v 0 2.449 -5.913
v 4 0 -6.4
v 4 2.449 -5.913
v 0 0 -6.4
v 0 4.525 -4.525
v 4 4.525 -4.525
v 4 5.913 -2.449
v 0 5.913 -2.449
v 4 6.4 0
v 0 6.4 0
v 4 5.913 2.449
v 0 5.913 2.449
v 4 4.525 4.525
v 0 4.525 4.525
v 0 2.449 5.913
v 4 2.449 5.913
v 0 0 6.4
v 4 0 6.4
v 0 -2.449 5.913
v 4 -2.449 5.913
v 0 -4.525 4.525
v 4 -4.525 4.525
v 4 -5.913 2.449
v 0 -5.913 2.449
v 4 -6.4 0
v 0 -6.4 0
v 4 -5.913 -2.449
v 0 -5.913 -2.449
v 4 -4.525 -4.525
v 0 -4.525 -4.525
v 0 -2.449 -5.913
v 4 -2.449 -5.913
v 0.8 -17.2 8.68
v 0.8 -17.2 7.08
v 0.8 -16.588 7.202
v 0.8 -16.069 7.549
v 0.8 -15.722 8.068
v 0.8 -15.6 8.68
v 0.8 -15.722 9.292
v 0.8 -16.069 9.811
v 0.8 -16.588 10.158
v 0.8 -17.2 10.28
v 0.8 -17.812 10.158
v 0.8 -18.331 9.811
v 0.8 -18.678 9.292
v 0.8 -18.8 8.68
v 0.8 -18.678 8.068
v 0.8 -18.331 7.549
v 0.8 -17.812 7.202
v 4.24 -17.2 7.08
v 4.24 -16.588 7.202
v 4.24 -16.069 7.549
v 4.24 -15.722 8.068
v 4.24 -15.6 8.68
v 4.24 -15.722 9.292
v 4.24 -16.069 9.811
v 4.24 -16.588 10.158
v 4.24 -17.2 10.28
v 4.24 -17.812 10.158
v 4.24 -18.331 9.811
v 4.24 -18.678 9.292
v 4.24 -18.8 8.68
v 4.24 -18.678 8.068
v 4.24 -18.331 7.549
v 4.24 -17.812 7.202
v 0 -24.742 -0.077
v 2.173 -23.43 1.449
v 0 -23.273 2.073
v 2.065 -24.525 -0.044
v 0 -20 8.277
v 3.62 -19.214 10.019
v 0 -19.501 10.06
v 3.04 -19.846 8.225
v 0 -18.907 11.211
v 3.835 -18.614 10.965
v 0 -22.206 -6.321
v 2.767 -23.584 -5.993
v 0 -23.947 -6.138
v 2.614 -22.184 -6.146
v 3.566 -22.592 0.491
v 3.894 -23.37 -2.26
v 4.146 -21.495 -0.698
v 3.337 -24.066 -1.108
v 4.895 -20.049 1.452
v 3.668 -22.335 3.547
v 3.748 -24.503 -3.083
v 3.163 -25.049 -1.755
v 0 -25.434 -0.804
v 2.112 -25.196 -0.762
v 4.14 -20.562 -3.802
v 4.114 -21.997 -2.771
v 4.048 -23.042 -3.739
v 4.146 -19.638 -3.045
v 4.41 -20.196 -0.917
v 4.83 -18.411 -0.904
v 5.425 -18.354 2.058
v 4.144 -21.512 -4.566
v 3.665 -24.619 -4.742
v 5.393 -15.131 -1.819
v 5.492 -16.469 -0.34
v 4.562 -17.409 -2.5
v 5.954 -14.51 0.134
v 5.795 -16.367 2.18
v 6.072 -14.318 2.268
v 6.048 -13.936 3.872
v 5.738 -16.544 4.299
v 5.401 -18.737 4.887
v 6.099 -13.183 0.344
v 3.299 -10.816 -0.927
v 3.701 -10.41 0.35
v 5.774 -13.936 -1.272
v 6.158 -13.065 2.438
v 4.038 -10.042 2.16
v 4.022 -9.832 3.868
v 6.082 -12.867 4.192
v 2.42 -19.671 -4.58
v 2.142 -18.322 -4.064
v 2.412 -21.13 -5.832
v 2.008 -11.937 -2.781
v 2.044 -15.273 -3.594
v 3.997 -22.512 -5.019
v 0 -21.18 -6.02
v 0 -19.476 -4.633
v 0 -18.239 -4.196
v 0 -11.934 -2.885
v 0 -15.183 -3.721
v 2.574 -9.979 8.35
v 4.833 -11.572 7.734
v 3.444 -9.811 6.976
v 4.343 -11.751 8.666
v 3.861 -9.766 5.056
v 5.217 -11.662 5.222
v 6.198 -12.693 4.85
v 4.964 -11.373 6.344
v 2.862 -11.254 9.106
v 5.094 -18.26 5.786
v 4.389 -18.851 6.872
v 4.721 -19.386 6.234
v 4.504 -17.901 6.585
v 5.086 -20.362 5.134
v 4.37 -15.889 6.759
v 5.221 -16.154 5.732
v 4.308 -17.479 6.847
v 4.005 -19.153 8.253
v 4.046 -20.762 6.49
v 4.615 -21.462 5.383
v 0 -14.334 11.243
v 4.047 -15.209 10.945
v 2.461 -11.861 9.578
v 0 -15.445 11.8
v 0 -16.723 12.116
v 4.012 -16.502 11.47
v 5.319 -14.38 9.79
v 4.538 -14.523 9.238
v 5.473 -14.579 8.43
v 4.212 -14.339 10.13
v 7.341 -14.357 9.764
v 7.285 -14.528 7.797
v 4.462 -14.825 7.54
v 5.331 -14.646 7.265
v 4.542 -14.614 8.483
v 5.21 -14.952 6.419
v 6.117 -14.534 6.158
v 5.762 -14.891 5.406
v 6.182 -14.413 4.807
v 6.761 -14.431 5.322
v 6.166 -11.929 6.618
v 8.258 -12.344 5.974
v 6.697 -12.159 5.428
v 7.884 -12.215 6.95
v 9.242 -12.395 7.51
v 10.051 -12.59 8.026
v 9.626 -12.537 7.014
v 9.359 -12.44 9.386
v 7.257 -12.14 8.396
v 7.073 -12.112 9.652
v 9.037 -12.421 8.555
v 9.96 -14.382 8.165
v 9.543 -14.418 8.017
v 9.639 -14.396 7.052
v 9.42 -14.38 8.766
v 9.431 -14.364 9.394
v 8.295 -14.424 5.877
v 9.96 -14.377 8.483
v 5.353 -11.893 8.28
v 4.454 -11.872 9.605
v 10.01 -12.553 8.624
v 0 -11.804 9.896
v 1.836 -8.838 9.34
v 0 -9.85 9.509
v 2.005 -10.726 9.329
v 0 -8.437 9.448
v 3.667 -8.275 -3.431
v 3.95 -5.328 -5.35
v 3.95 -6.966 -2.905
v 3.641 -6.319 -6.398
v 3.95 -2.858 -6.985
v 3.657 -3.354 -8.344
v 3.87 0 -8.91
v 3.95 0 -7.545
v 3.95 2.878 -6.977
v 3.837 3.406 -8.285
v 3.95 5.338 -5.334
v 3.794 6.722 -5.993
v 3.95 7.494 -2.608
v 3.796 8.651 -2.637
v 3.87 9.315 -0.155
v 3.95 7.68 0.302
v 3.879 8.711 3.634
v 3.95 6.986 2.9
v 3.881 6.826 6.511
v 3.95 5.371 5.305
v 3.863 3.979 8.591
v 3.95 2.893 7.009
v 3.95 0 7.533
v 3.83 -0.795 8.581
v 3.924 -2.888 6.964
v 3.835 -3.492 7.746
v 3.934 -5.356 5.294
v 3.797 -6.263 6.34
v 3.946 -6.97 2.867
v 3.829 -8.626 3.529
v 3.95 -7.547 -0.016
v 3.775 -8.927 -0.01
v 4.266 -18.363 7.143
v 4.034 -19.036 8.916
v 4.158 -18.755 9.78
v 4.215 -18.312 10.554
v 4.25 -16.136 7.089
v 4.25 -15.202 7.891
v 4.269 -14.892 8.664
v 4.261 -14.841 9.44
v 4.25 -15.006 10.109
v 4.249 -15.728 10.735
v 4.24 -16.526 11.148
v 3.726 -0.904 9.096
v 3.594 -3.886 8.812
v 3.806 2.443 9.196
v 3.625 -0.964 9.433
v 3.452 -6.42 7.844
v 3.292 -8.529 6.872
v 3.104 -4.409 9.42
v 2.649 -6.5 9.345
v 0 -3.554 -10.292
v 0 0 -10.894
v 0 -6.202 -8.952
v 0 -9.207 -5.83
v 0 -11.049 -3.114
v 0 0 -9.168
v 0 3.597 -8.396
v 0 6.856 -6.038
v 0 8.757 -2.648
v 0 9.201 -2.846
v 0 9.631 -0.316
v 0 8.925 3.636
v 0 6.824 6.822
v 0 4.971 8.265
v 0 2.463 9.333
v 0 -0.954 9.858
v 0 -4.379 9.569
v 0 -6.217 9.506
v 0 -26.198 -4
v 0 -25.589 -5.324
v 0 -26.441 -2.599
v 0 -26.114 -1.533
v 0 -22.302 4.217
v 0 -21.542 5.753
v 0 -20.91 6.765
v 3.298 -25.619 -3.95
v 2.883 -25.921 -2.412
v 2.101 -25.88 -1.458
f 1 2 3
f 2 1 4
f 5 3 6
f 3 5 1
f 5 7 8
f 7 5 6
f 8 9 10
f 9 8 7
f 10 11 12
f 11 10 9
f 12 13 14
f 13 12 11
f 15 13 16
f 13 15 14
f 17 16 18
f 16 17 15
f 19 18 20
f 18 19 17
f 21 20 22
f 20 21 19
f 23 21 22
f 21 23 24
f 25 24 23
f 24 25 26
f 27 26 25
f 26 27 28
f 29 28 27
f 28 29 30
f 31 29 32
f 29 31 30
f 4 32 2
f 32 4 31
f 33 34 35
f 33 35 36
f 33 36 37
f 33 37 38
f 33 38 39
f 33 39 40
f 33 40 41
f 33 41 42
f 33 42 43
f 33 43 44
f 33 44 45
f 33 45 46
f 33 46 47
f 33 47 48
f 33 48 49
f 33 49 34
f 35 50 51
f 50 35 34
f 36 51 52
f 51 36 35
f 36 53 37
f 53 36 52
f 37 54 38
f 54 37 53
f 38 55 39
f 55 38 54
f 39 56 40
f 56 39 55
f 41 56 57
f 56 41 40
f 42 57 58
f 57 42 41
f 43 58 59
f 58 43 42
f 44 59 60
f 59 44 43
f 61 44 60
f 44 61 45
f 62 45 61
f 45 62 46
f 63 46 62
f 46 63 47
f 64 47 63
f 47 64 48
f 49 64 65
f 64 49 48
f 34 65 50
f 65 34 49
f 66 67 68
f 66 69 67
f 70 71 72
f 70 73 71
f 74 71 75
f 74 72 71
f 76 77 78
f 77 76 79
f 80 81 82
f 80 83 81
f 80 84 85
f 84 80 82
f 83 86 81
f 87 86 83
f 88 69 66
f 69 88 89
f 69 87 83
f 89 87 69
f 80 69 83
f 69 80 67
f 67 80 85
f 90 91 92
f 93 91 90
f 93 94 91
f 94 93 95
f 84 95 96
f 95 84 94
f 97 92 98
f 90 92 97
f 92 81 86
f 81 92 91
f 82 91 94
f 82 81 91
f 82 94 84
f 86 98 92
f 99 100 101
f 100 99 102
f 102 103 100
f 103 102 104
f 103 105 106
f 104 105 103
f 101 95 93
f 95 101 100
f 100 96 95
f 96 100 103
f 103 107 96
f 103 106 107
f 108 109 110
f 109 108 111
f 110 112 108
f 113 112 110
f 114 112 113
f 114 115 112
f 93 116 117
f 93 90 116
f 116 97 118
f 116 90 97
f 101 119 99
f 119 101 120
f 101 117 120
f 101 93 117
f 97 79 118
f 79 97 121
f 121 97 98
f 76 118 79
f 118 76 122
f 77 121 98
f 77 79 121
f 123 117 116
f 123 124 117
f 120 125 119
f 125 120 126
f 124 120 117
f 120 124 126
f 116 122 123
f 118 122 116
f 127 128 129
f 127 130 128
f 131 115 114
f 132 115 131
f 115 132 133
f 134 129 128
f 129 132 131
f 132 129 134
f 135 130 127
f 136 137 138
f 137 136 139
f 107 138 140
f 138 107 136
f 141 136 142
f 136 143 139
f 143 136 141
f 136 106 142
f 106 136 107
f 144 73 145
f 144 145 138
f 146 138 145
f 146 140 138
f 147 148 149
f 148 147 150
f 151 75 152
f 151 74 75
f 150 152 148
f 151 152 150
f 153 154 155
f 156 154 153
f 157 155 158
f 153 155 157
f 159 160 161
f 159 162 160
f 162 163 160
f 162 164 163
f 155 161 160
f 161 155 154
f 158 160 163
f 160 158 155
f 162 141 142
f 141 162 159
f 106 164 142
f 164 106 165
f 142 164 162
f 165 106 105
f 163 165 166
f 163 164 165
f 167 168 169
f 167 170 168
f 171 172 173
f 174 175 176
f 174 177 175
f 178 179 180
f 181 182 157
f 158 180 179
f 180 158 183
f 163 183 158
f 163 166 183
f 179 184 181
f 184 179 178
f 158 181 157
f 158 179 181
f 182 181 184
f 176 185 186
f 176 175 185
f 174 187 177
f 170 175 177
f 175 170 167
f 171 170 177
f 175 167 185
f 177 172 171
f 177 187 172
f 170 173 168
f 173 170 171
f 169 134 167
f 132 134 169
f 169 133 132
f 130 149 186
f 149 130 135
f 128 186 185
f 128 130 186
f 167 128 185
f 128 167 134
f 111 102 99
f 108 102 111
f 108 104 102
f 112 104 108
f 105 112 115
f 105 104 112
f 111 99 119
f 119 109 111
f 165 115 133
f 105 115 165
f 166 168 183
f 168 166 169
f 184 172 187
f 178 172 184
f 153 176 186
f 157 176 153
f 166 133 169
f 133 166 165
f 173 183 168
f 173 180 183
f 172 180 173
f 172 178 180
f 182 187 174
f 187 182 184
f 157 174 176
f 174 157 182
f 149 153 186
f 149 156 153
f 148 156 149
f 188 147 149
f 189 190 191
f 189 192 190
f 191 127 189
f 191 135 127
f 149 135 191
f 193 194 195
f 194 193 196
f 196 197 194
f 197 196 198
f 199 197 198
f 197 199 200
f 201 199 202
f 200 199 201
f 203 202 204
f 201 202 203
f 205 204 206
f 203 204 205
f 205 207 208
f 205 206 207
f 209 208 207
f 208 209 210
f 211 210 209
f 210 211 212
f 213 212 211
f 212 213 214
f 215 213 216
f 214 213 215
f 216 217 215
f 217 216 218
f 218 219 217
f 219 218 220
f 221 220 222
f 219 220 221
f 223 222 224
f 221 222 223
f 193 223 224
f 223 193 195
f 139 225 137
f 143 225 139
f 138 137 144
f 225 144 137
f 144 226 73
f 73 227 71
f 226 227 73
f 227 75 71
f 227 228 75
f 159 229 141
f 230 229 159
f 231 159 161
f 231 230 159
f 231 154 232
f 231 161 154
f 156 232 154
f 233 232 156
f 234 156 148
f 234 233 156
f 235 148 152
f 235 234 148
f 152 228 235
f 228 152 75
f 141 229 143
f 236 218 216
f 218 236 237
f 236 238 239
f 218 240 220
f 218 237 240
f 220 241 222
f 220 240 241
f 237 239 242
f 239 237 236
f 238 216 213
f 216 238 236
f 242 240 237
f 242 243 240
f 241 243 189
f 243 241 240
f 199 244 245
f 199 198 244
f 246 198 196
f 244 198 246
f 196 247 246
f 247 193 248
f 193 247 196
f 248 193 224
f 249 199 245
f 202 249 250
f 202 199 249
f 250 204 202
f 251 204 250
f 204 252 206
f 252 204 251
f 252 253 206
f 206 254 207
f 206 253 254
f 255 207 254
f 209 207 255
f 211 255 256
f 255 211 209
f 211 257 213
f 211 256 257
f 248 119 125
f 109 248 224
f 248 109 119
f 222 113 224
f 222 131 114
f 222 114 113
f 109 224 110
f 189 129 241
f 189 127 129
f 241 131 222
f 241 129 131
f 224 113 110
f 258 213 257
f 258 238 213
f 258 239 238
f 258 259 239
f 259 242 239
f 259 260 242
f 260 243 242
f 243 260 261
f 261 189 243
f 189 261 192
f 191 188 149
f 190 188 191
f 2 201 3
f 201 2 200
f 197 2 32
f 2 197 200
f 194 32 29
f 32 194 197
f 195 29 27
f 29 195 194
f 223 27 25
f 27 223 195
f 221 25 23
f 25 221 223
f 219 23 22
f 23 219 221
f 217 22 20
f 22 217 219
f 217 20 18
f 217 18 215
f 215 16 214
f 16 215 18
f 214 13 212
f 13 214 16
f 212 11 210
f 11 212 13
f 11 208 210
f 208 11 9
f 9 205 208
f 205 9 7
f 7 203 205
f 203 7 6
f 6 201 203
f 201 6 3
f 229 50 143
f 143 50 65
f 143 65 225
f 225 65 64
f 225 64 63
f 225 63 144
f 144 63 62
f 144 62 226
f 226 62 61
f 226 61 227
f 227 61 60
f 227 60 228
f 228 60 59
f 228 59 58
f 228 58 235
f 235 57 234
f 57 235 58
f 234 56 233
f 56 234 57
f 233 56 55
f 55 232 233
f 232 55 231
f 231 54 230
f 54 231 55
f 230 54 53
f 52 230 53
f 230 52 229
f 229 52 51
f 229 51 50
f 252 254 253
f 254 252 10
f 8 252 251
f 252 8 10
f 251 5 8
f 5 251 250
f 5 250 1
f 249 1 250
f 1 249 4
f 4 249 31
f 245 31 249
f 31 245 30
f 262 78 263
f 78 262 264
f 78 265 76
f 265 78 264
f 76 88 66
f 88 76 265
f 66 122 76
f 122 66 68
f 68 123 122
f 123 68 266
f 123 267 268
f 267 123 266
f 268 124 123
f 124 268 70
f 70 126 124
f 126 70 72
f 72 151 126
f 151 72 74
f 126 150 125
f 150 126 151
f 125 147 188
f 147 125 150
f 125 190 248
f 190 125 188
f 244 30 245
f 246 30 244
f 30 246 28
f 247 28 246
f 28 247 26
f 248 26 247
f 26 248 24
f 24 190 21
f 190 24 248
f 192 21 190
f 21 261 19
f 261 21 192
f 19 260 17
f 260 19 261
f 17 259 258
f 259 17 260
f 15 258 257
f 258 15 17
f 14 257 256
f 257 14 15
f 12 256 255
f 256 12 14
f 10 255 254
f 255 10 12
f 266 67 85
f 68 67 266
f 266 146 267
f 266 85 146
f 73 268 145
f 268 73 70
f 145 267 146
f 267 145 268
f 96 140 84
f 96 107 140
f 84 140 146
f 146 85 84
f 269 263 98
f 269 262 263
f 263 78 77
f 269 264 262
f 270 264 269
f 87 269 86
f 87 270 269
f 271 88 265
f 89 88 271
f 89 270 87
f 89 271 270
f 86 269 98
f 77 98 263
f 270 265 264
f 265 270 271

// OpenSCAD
use <../lib.scad>
use <s/64835s01.scad>
$fa=1; $fs=0.2;
function ldraw_lib__64835(realsolid=false) = [
// 0 ~Animal Cow Head Left
// 0 Name: 64835.dat
// 0 Author: Philippe Hurbain [Philo]
// 0 !LDRAW_ORG Part UPDATE 2015-01
// 0 !LICENSE Licensed under CC BY 2.0 and CC BY 4.0 : see CAreadme.txt
// 
// 0 BFC CERTIFY CCW
  [0,"BFC","CERTIFY"],
  [0,"BFC","CCW"],
// 
// 0 !HISTORY 2013-12-19 {LEGO Digital Designer} Original part shape
// 0 !HISTORY 2013-12-19 [Philo] File preparation for LDraw Parts Tracker
// 0 !HISTORY 2015-10-11 [PTadmin] Official Update 2015-01
// 
// 
// 1 16 0 0 0 1 0 0 0 1 0 0 0 1 s\64835s01.dat
  [1,16,0,0,0,1,0,0,0,1,0,0,0,1, ldraw_lib__s__64835s01(realsolid)],
// 0 // Blaze
// 3 16 0 -10.543 -55.754 5.433 -3.622 -58.575 9.169 -8.867 -55.838
  [3,16,0,-10.543,-55.754,5.433,-3.622,-58.575,9.169,-8.867,-55.838],
// 3 16 0 -5.183 -58.182 5.433 -3.622 -58.575 0 -10.543 -55.754
  [3,16,0,-5.183,-58.182,5.433,-3.622,-58.575,0,-10.543,-55.754],
// 3 16 0 -10.543 -55.754 11.538 -13.457 -53.654 0 -14.382 -53.854
  [3,16,0,-10.543,-55.754,11.538,-13.457,-53.654,0,-14.382,-53.854],
// 3 16 0 -10.543 -55.754 9.169 -8.867 -55.838 11.538 -13.457 -53.654
  [3,16,0,-10.543,-55.754,9.169,-8.867,-55.838,11.538,-13.457,-53.654],
// 3 16 7.599 -20.563 -49.615 0 -16.913 -52.275 10.115 -16.226 -51.906
  [3,16,7.599,-20.563,-49.615,0,-16.913,-52.275,10.115,-16.226,-51.906],
// 3 16 0 -16.913 -52.275 7.599 -20.563 -49.615 0 -20.693 -49.999
  [3,16,0,-16.913,-52.275,7.599,-20.563,-49.615,0,-20.693,-49.999],
// 3 16 10.115 -16.226 -51.906 0 -14.382 -53.854 11.538 -13.457 -53.654
  [3,16,10.115,-16.226,-51.906,0,-14.382,-53.854,11.538,-13.457,-53.654],
// 3 16 0 -14.382 -53.854 10.115 -16.226 -51.906 0 -16.913 -52.275
  [3,16,0,-14.382,-53.854,10.115,-16.226,-51.906,0,-16.913,-52.275],
// 0 // Eye
// 3 16 13.562 -5.145 -45.885 12.714 -12.836 -50.906 12.237 -3.63 -50.122
  [3,16,13.562,-5.145,-45.885,12.714,-12.836,-50.906,12.237,-3.63,-50.122],
// 3 16 13.562 -5.145 -45.885 13.503 -12.218 -46.842 12.714 -12.836 -50.906
  [3,16,13.562,-5.145,-45.885,13.503,-12.218,-46.842,12.714,-12.836,-50.906],
// 3 16 12.237 -3.63 -50.122 12.714 -12.836 -50.906 11.538 -13.457 -53.654
  [3,16,12.237,-3.63,-50.122,12.714,-12.836,-50.906,11.538,-13.457,-53.654],
// 3 16 11.538 -13.457 -53.654 9.169 -8.867 -55.838 12.237 -3.63 -50.122
  [3,16,11.538,-13.457,-53.654,9.169,-8.867,-55.838,12.237,-3.63,-50.122],
// 0 // Muzzle
// 3 16 8.244 9.875 -64.048 0 13.311 -63.972 9.162 11.854 -61.547
  [3,16,8.244,9.875,-64.048,0,13.311,-63.972,9.162,11.854,-61.547],
// 3 16 8.244 9.875 -64.048 0 10 -65.494 0 13.311 -63.972
  [3,16,8.244,9.875,-64.048,0,10,-65.494,0,13.311,-63.972],
// 3 16 0 13.311 -63.972 0 15.345 -59.867 6.918 14.983 -58.959
  [3,16,0,13.311,-63.972,0,15.345,-59.867,6.918,14.983,-58.959],
// 3 16 8.244 9.875 -64.048 0 6.498 -66.102 0 10 -65.494
  [3,16,8.244,9.875,-64.048,0,6.498,-66.102,0,10,-65.494],
// 3 16 7.207 6.029 -64.803 0 6.498 -66.102 8.244 9.875 -64.048
  [3,16,7.207,6.029,-64.803,0,6.498,-66.102,8.244,9.875,-64.048],
// 3 16 7.907 4.388 -62.623 8.244 9.875 -64.048 9.369 7.707 -61.257
  [3,16,7.907,4.388,-62.623,8.244,9.875,-64.048,9.369,7.707,-61.257],
// 3 16 7.907 4.388 -62.623 7.207 6.029 -64.803 8.244 9.875 -64.048
  [3,16,7.907,4.388,-62.623,7.207,6.029,-64.803,8.244,9.875,-64.048],
// 3 16 5.253 3.646 -64.701 0 2.01 -63.584 0 3.833 -65.285
  [3,16,5.253,3.646,-64.701,0,2.01,-63.584,0,3.833,-65.285],
// 3 16 5.281 1.905 -62.989 0 2.01 -63.584 5.253 3.646 -64.701
  [3,16,5.281,1.905,-62.989,0,2.01,-63.584,5.253,3.646,-64.701],
// 3 16 5.281 1.905 -62.989 7.207 6.029 -64.803 7.907 4.388 -62.623
  [3,16,5.281,1.905,-62.989,7.207,6.029,-64.803,7.907,4.388,-62.623],
// 3 16 5.281 1.905 -62.989 5.253 3.646 -64.701 7.207 6.029 -64.803
  [3,16,5.281,1.905,-62.989,5.253,3.646,-64.701,7.207,6.029,-64.803],
// 3 16 9.369 7.707 -61.257 8.244 9.875 -64.048 9.162 11.854 -61.547
  [3,16,9.369,7.707,-61.257,8.244,9.875,-64.048,9.162,11.854,-61.547],
// 3 16 6.918 14.983 -58.959 9.162 11.854 -61.547 0 13.311 -63.972
  [3,16,6.918,14.983,-58.959,9.162,11.854,-61.547,0,13.311,-63.972],
// 3 16 7.207 6.029 -64.803 0 3.833 -65.285 0 6.498 -66.102
  [3,16,7.207,6.029,-64.803,0,3.833,-65.285,0,6.498,-66.102],
// 3 16 0 3.833 -65.285 7.207 6.029 -64.803 5.253 3.646 -64.701
  [3,16,0,3.833,-65.285,7.207,6.029,-64.803,5.253,3.646,-64.701],
// 0 // Condlines
// 5 24 0 -10.543 -55.754 5.433 -3.622 -58.575 9.169 -8.867 -55.838 0 -5.183 -58.182
  [5,24,0,-10.543,-55.754,5.433,-3.622,-58.575,9.169,-8.867,-55.838,0,-5.183,-58.182],
// 5 24 9.169 -8.867 -55.838 0 -10.543 -55.754 5.433 -3.622 -58.575 11.538 -13.457 -53.654
  [5,24,9.169,-8.867,-55.838,0,-10.543,-55.754,5.433,-3.622,-58.575,11.538,-13.457,-53.654],
// 5 24 0 -10.543 -55.754 11.538 -13.457 -53.654 0 -14.382 -53.854 9.169 -8.867 -55.838
  [5,24,0,-10.543,-55.754,11.538,-13.457,-53.654,0,-14.382,-53.854,9.169,-8.867,-55.838],
// 5 24 11.538 -13.457 -53.654 0 -14.382 -53.854 0 -10.543 -55.754 10.115 -16.226 -51.906
  [5,24,11.538,-13.457,-53.654,0,-14.382,-53.854,0,-10.543,-55.754,10.115,-16.226,-51.906],
// 5 24 9.169 -8.867 -55.838 11.538 -13.457 -53.654 0 -10.543 -55.754 12.237 -3.63 -50.122
  [5,24,9.169,-8.867,-55.838,11.538,-13.457,-53.654,0,-10.543,-55.754,12.237,-3.63,-50.122],
// 5 24 7.599 -20.563 -49.615 0 -16.913 -52.275 10.115 -16.226 -51.906 0 -20.693 -49.999
  [5,24,7.599,-20.563,-49.615,0,-16.913,-52.275,10.115,-16.226,-51.906,0,-20.693,-49.999],
// 5 24 0 -16.913 -52.275 10.115 -16.226 -51.906 7.599 -20.563 -49.615 0 -14.382 -53.854
  [5,24,0,-16.913,-52.275,10.115,-16.226,-51.906,7.599,-20.563,-49.615,0,-14.382,-53.854],
// 5 24 10.115 -16.226 -51.906 0 -14.382 -53.854 11.538 -13.457 -53.654 0 -16.913 -52.275
  [5,24,10.115,-16.226,-51.906,0,-14.382,-53.854,11.538,-13.457,-53.654,0,-16.913,-52.275],
// 5 24 13.562 -5.145 -45.885 12.714 -12.836 -50.906 12.237 -3.63 -50.122 13.503 -12.218 -46.842
  [5,24,13.562,-5.145,-45.885,12.714,-12.836,-50.906,12.237,-3.63,-50.122,13.503,-12.218,-46.842],
// 5 24 12.714 -12.836 -50.906 12.237 -3.63 -50.122 13.562 -5.145 -45.885 11.538 -13.457 -53.654
  [5,24,12.714,-12.836,-50.906,12.237,-3.63,-50.122,13.562,-5.145,-45.885,11.538,-13.457,-53.654],
// 5 24 11.538 -13.457 -53.654 12.237 -3.63 -50.122 12.714 -12.836 -50.906 9.169 -8.867 -55.838
  [5,24,11.538,-13.457,-53.654,12.237,-3.63,-50.122,12.714,-12.836,-50.906,9.169,-8.867,-55.838],
// 5 24 7.207 6.029 -64.803 0 3.833 -65.285 0 6.498 -66.102 5.253 3.646 -64.701
  [5,24,7.207,6.029,-64.803,0,3.833,-65.285,0,6.498,-66.102,5.253,3.646,-64.701],
// 5 24 0 6.498 -66.102 7.207 6.029 -64.803 0 3.833 -65.285 8.244 9.875 -64.048
  [5,24,0,6.498,-66.102,7.207,6.029,-64.803,0,3.833,-65.285,8.244,9.875,-64.048],
// 5 24 7.207 6.029 -64.803 5.253 3.646 -64.701 0 3.833 -65.285 5.281 1.905 -62.989
  [5,24,7.207,6.029,-64.803,5.253,3.646,-64.701,0,3.833,-65.285,5.281,1.905,-62.989],
// 5 24 5.253 3.646 -64.701 0 3.833 -65.285 7.207 6.029 -64.803 0 2.01 -63.584
  [5,24,5.253,3.646,-64.701,0,3.833,-65.285,7.207,6.029,-64.803,0,2.01,-63.584],
// 5 24 8.244 9.875 -64.048 0 13.311 -63.972 9.162 11.854 -61.547 0 10 -65.494
  [5,24,8.244,9.875,-64.048,0,13.311,-63.972,9.162,11.854,-61.547,0,10,-65.494],
// 5 24 9.162 11.854 -61.547 8.244 9.875 -64.048 0 13.311 -63.972 9.369 7.707 -61.257
  [5,24,9.162,11.854,-61.547,8.244,9.875,-64.048,0,13.311,-63.972,9.369,7.707,-61.257],
// 5 24 8.244 9.875 -64.048 0 10 -65.494 0 13.311 -63.972 0 6.498 -66.102
  [5,24,8.244,9.875,-64.048,0,10,-65.494,0,13.311,-63.972,0,6.498,-66.102],
// 5 24 8.244 9.875 -64.048 0 6.498 -66.102 0 10 -65.494 7.207 6.029 -64.803
  [5,24,8.244,9.875,-64.048,0,6.498,-66.102,0,10,-65.494,7.207,6.029,-64.803],
// 5 24 8.244 9.875 -64.048 7.207 6.029 -64.803 0 6.498 -66.102 7.907 4.388 -62.623
  [5,24,8.244,9.875,-64.048,7.207,6.029,-64.803,0,6.498,-66.102,7.907,4.388,-62.623],
// 5 24 7.907 4.388 -62.623 8.244 9.875 -64.048 9.369 7.707 -61.257 7.207 6.029 -64.803
  [5,24,7.907,4.388,-62.623,8.244,9.875,-64.048,9.369,7.707,-61.257,7.207,6.029,-64.803],
// 5 24 8.244 9.875 -64.048 9.369 7.707 -61.257 7.907 4.388 -62.623 9.162 11.854 -61.547
  [5,24,8.244,9.875,-64.048,9.369,7.707,-61.257,7.907,4.388,-62.623,9.162,11.854,-61.547],
// 5 24 7.907 4.388 -62.623 7.207 6.029 -64.803 8.244 9.875 -64.048 5.281 1.905 -62.989
  [5,24,7.907,4.388,-62.623,7.207,6.029,-64.803,8.244,9.875,-64.048,5.281,1.905,-62.989],
// 5 24 5.253 3.646 -64.701 0 2.01 -63.584 0 3.833 -65.285 5.281 1.905 -62.989
  [5,24,5.253,3.646,-64.701,0,2.01,-63.584,0,3.833,-65.285,5.281,1.905,-62.989],
// 5 24 5.253 3.646 -64.701 5.281 1.905 -62.989 0 2.01 -63.584 7.207 6.029 -64.803
  [5,24,5.253,3.646,-64.701,5.281,1.905,-62.989,0,2.01,-63.584,7.207,6.029,-64.803],
// 5 24 5.281 1.905 -62.989 7.207 6.029 -64.803 7.907 4.388 -62.623 5.253 3.646 -64.701
  [5,24,5.281,1.905,-62.989,7.207,6.029,-64.803,7.907,4.388,-62.623,5.253,3.646,-64.701],
// 5 24 9.162 11.854 -61.547 0 13.311 -63.972 6.918 14.983 -58.959 8.244 9.875 -64.048
  [5,24,9.162,11.854,-61.547,0,13.311,-63.972,6.918,14.983,-58.959,8.244,9.875,-64.048],
// 5 24 0 13.311 -63.972 6.918 14.983 -58.959 0 15.345 -59.867 9.162 11.854 -61.547
  [5,24,0,13.311,-63.972,6.918,14.983,-58.959,0,15.345,-59.867,9.162,11.854,-61.547],
];
module ldraw_lib__64835(step=0, col=false, unit=2/5, alt=false, line=0.2, solid=!$preview)
    makepoly(ldraw_lib__64835(solid), step=step, col=col, unit=unit, alt=alt, line=line, solid=solid);
ldraw_lib__64835(line=0.2);
